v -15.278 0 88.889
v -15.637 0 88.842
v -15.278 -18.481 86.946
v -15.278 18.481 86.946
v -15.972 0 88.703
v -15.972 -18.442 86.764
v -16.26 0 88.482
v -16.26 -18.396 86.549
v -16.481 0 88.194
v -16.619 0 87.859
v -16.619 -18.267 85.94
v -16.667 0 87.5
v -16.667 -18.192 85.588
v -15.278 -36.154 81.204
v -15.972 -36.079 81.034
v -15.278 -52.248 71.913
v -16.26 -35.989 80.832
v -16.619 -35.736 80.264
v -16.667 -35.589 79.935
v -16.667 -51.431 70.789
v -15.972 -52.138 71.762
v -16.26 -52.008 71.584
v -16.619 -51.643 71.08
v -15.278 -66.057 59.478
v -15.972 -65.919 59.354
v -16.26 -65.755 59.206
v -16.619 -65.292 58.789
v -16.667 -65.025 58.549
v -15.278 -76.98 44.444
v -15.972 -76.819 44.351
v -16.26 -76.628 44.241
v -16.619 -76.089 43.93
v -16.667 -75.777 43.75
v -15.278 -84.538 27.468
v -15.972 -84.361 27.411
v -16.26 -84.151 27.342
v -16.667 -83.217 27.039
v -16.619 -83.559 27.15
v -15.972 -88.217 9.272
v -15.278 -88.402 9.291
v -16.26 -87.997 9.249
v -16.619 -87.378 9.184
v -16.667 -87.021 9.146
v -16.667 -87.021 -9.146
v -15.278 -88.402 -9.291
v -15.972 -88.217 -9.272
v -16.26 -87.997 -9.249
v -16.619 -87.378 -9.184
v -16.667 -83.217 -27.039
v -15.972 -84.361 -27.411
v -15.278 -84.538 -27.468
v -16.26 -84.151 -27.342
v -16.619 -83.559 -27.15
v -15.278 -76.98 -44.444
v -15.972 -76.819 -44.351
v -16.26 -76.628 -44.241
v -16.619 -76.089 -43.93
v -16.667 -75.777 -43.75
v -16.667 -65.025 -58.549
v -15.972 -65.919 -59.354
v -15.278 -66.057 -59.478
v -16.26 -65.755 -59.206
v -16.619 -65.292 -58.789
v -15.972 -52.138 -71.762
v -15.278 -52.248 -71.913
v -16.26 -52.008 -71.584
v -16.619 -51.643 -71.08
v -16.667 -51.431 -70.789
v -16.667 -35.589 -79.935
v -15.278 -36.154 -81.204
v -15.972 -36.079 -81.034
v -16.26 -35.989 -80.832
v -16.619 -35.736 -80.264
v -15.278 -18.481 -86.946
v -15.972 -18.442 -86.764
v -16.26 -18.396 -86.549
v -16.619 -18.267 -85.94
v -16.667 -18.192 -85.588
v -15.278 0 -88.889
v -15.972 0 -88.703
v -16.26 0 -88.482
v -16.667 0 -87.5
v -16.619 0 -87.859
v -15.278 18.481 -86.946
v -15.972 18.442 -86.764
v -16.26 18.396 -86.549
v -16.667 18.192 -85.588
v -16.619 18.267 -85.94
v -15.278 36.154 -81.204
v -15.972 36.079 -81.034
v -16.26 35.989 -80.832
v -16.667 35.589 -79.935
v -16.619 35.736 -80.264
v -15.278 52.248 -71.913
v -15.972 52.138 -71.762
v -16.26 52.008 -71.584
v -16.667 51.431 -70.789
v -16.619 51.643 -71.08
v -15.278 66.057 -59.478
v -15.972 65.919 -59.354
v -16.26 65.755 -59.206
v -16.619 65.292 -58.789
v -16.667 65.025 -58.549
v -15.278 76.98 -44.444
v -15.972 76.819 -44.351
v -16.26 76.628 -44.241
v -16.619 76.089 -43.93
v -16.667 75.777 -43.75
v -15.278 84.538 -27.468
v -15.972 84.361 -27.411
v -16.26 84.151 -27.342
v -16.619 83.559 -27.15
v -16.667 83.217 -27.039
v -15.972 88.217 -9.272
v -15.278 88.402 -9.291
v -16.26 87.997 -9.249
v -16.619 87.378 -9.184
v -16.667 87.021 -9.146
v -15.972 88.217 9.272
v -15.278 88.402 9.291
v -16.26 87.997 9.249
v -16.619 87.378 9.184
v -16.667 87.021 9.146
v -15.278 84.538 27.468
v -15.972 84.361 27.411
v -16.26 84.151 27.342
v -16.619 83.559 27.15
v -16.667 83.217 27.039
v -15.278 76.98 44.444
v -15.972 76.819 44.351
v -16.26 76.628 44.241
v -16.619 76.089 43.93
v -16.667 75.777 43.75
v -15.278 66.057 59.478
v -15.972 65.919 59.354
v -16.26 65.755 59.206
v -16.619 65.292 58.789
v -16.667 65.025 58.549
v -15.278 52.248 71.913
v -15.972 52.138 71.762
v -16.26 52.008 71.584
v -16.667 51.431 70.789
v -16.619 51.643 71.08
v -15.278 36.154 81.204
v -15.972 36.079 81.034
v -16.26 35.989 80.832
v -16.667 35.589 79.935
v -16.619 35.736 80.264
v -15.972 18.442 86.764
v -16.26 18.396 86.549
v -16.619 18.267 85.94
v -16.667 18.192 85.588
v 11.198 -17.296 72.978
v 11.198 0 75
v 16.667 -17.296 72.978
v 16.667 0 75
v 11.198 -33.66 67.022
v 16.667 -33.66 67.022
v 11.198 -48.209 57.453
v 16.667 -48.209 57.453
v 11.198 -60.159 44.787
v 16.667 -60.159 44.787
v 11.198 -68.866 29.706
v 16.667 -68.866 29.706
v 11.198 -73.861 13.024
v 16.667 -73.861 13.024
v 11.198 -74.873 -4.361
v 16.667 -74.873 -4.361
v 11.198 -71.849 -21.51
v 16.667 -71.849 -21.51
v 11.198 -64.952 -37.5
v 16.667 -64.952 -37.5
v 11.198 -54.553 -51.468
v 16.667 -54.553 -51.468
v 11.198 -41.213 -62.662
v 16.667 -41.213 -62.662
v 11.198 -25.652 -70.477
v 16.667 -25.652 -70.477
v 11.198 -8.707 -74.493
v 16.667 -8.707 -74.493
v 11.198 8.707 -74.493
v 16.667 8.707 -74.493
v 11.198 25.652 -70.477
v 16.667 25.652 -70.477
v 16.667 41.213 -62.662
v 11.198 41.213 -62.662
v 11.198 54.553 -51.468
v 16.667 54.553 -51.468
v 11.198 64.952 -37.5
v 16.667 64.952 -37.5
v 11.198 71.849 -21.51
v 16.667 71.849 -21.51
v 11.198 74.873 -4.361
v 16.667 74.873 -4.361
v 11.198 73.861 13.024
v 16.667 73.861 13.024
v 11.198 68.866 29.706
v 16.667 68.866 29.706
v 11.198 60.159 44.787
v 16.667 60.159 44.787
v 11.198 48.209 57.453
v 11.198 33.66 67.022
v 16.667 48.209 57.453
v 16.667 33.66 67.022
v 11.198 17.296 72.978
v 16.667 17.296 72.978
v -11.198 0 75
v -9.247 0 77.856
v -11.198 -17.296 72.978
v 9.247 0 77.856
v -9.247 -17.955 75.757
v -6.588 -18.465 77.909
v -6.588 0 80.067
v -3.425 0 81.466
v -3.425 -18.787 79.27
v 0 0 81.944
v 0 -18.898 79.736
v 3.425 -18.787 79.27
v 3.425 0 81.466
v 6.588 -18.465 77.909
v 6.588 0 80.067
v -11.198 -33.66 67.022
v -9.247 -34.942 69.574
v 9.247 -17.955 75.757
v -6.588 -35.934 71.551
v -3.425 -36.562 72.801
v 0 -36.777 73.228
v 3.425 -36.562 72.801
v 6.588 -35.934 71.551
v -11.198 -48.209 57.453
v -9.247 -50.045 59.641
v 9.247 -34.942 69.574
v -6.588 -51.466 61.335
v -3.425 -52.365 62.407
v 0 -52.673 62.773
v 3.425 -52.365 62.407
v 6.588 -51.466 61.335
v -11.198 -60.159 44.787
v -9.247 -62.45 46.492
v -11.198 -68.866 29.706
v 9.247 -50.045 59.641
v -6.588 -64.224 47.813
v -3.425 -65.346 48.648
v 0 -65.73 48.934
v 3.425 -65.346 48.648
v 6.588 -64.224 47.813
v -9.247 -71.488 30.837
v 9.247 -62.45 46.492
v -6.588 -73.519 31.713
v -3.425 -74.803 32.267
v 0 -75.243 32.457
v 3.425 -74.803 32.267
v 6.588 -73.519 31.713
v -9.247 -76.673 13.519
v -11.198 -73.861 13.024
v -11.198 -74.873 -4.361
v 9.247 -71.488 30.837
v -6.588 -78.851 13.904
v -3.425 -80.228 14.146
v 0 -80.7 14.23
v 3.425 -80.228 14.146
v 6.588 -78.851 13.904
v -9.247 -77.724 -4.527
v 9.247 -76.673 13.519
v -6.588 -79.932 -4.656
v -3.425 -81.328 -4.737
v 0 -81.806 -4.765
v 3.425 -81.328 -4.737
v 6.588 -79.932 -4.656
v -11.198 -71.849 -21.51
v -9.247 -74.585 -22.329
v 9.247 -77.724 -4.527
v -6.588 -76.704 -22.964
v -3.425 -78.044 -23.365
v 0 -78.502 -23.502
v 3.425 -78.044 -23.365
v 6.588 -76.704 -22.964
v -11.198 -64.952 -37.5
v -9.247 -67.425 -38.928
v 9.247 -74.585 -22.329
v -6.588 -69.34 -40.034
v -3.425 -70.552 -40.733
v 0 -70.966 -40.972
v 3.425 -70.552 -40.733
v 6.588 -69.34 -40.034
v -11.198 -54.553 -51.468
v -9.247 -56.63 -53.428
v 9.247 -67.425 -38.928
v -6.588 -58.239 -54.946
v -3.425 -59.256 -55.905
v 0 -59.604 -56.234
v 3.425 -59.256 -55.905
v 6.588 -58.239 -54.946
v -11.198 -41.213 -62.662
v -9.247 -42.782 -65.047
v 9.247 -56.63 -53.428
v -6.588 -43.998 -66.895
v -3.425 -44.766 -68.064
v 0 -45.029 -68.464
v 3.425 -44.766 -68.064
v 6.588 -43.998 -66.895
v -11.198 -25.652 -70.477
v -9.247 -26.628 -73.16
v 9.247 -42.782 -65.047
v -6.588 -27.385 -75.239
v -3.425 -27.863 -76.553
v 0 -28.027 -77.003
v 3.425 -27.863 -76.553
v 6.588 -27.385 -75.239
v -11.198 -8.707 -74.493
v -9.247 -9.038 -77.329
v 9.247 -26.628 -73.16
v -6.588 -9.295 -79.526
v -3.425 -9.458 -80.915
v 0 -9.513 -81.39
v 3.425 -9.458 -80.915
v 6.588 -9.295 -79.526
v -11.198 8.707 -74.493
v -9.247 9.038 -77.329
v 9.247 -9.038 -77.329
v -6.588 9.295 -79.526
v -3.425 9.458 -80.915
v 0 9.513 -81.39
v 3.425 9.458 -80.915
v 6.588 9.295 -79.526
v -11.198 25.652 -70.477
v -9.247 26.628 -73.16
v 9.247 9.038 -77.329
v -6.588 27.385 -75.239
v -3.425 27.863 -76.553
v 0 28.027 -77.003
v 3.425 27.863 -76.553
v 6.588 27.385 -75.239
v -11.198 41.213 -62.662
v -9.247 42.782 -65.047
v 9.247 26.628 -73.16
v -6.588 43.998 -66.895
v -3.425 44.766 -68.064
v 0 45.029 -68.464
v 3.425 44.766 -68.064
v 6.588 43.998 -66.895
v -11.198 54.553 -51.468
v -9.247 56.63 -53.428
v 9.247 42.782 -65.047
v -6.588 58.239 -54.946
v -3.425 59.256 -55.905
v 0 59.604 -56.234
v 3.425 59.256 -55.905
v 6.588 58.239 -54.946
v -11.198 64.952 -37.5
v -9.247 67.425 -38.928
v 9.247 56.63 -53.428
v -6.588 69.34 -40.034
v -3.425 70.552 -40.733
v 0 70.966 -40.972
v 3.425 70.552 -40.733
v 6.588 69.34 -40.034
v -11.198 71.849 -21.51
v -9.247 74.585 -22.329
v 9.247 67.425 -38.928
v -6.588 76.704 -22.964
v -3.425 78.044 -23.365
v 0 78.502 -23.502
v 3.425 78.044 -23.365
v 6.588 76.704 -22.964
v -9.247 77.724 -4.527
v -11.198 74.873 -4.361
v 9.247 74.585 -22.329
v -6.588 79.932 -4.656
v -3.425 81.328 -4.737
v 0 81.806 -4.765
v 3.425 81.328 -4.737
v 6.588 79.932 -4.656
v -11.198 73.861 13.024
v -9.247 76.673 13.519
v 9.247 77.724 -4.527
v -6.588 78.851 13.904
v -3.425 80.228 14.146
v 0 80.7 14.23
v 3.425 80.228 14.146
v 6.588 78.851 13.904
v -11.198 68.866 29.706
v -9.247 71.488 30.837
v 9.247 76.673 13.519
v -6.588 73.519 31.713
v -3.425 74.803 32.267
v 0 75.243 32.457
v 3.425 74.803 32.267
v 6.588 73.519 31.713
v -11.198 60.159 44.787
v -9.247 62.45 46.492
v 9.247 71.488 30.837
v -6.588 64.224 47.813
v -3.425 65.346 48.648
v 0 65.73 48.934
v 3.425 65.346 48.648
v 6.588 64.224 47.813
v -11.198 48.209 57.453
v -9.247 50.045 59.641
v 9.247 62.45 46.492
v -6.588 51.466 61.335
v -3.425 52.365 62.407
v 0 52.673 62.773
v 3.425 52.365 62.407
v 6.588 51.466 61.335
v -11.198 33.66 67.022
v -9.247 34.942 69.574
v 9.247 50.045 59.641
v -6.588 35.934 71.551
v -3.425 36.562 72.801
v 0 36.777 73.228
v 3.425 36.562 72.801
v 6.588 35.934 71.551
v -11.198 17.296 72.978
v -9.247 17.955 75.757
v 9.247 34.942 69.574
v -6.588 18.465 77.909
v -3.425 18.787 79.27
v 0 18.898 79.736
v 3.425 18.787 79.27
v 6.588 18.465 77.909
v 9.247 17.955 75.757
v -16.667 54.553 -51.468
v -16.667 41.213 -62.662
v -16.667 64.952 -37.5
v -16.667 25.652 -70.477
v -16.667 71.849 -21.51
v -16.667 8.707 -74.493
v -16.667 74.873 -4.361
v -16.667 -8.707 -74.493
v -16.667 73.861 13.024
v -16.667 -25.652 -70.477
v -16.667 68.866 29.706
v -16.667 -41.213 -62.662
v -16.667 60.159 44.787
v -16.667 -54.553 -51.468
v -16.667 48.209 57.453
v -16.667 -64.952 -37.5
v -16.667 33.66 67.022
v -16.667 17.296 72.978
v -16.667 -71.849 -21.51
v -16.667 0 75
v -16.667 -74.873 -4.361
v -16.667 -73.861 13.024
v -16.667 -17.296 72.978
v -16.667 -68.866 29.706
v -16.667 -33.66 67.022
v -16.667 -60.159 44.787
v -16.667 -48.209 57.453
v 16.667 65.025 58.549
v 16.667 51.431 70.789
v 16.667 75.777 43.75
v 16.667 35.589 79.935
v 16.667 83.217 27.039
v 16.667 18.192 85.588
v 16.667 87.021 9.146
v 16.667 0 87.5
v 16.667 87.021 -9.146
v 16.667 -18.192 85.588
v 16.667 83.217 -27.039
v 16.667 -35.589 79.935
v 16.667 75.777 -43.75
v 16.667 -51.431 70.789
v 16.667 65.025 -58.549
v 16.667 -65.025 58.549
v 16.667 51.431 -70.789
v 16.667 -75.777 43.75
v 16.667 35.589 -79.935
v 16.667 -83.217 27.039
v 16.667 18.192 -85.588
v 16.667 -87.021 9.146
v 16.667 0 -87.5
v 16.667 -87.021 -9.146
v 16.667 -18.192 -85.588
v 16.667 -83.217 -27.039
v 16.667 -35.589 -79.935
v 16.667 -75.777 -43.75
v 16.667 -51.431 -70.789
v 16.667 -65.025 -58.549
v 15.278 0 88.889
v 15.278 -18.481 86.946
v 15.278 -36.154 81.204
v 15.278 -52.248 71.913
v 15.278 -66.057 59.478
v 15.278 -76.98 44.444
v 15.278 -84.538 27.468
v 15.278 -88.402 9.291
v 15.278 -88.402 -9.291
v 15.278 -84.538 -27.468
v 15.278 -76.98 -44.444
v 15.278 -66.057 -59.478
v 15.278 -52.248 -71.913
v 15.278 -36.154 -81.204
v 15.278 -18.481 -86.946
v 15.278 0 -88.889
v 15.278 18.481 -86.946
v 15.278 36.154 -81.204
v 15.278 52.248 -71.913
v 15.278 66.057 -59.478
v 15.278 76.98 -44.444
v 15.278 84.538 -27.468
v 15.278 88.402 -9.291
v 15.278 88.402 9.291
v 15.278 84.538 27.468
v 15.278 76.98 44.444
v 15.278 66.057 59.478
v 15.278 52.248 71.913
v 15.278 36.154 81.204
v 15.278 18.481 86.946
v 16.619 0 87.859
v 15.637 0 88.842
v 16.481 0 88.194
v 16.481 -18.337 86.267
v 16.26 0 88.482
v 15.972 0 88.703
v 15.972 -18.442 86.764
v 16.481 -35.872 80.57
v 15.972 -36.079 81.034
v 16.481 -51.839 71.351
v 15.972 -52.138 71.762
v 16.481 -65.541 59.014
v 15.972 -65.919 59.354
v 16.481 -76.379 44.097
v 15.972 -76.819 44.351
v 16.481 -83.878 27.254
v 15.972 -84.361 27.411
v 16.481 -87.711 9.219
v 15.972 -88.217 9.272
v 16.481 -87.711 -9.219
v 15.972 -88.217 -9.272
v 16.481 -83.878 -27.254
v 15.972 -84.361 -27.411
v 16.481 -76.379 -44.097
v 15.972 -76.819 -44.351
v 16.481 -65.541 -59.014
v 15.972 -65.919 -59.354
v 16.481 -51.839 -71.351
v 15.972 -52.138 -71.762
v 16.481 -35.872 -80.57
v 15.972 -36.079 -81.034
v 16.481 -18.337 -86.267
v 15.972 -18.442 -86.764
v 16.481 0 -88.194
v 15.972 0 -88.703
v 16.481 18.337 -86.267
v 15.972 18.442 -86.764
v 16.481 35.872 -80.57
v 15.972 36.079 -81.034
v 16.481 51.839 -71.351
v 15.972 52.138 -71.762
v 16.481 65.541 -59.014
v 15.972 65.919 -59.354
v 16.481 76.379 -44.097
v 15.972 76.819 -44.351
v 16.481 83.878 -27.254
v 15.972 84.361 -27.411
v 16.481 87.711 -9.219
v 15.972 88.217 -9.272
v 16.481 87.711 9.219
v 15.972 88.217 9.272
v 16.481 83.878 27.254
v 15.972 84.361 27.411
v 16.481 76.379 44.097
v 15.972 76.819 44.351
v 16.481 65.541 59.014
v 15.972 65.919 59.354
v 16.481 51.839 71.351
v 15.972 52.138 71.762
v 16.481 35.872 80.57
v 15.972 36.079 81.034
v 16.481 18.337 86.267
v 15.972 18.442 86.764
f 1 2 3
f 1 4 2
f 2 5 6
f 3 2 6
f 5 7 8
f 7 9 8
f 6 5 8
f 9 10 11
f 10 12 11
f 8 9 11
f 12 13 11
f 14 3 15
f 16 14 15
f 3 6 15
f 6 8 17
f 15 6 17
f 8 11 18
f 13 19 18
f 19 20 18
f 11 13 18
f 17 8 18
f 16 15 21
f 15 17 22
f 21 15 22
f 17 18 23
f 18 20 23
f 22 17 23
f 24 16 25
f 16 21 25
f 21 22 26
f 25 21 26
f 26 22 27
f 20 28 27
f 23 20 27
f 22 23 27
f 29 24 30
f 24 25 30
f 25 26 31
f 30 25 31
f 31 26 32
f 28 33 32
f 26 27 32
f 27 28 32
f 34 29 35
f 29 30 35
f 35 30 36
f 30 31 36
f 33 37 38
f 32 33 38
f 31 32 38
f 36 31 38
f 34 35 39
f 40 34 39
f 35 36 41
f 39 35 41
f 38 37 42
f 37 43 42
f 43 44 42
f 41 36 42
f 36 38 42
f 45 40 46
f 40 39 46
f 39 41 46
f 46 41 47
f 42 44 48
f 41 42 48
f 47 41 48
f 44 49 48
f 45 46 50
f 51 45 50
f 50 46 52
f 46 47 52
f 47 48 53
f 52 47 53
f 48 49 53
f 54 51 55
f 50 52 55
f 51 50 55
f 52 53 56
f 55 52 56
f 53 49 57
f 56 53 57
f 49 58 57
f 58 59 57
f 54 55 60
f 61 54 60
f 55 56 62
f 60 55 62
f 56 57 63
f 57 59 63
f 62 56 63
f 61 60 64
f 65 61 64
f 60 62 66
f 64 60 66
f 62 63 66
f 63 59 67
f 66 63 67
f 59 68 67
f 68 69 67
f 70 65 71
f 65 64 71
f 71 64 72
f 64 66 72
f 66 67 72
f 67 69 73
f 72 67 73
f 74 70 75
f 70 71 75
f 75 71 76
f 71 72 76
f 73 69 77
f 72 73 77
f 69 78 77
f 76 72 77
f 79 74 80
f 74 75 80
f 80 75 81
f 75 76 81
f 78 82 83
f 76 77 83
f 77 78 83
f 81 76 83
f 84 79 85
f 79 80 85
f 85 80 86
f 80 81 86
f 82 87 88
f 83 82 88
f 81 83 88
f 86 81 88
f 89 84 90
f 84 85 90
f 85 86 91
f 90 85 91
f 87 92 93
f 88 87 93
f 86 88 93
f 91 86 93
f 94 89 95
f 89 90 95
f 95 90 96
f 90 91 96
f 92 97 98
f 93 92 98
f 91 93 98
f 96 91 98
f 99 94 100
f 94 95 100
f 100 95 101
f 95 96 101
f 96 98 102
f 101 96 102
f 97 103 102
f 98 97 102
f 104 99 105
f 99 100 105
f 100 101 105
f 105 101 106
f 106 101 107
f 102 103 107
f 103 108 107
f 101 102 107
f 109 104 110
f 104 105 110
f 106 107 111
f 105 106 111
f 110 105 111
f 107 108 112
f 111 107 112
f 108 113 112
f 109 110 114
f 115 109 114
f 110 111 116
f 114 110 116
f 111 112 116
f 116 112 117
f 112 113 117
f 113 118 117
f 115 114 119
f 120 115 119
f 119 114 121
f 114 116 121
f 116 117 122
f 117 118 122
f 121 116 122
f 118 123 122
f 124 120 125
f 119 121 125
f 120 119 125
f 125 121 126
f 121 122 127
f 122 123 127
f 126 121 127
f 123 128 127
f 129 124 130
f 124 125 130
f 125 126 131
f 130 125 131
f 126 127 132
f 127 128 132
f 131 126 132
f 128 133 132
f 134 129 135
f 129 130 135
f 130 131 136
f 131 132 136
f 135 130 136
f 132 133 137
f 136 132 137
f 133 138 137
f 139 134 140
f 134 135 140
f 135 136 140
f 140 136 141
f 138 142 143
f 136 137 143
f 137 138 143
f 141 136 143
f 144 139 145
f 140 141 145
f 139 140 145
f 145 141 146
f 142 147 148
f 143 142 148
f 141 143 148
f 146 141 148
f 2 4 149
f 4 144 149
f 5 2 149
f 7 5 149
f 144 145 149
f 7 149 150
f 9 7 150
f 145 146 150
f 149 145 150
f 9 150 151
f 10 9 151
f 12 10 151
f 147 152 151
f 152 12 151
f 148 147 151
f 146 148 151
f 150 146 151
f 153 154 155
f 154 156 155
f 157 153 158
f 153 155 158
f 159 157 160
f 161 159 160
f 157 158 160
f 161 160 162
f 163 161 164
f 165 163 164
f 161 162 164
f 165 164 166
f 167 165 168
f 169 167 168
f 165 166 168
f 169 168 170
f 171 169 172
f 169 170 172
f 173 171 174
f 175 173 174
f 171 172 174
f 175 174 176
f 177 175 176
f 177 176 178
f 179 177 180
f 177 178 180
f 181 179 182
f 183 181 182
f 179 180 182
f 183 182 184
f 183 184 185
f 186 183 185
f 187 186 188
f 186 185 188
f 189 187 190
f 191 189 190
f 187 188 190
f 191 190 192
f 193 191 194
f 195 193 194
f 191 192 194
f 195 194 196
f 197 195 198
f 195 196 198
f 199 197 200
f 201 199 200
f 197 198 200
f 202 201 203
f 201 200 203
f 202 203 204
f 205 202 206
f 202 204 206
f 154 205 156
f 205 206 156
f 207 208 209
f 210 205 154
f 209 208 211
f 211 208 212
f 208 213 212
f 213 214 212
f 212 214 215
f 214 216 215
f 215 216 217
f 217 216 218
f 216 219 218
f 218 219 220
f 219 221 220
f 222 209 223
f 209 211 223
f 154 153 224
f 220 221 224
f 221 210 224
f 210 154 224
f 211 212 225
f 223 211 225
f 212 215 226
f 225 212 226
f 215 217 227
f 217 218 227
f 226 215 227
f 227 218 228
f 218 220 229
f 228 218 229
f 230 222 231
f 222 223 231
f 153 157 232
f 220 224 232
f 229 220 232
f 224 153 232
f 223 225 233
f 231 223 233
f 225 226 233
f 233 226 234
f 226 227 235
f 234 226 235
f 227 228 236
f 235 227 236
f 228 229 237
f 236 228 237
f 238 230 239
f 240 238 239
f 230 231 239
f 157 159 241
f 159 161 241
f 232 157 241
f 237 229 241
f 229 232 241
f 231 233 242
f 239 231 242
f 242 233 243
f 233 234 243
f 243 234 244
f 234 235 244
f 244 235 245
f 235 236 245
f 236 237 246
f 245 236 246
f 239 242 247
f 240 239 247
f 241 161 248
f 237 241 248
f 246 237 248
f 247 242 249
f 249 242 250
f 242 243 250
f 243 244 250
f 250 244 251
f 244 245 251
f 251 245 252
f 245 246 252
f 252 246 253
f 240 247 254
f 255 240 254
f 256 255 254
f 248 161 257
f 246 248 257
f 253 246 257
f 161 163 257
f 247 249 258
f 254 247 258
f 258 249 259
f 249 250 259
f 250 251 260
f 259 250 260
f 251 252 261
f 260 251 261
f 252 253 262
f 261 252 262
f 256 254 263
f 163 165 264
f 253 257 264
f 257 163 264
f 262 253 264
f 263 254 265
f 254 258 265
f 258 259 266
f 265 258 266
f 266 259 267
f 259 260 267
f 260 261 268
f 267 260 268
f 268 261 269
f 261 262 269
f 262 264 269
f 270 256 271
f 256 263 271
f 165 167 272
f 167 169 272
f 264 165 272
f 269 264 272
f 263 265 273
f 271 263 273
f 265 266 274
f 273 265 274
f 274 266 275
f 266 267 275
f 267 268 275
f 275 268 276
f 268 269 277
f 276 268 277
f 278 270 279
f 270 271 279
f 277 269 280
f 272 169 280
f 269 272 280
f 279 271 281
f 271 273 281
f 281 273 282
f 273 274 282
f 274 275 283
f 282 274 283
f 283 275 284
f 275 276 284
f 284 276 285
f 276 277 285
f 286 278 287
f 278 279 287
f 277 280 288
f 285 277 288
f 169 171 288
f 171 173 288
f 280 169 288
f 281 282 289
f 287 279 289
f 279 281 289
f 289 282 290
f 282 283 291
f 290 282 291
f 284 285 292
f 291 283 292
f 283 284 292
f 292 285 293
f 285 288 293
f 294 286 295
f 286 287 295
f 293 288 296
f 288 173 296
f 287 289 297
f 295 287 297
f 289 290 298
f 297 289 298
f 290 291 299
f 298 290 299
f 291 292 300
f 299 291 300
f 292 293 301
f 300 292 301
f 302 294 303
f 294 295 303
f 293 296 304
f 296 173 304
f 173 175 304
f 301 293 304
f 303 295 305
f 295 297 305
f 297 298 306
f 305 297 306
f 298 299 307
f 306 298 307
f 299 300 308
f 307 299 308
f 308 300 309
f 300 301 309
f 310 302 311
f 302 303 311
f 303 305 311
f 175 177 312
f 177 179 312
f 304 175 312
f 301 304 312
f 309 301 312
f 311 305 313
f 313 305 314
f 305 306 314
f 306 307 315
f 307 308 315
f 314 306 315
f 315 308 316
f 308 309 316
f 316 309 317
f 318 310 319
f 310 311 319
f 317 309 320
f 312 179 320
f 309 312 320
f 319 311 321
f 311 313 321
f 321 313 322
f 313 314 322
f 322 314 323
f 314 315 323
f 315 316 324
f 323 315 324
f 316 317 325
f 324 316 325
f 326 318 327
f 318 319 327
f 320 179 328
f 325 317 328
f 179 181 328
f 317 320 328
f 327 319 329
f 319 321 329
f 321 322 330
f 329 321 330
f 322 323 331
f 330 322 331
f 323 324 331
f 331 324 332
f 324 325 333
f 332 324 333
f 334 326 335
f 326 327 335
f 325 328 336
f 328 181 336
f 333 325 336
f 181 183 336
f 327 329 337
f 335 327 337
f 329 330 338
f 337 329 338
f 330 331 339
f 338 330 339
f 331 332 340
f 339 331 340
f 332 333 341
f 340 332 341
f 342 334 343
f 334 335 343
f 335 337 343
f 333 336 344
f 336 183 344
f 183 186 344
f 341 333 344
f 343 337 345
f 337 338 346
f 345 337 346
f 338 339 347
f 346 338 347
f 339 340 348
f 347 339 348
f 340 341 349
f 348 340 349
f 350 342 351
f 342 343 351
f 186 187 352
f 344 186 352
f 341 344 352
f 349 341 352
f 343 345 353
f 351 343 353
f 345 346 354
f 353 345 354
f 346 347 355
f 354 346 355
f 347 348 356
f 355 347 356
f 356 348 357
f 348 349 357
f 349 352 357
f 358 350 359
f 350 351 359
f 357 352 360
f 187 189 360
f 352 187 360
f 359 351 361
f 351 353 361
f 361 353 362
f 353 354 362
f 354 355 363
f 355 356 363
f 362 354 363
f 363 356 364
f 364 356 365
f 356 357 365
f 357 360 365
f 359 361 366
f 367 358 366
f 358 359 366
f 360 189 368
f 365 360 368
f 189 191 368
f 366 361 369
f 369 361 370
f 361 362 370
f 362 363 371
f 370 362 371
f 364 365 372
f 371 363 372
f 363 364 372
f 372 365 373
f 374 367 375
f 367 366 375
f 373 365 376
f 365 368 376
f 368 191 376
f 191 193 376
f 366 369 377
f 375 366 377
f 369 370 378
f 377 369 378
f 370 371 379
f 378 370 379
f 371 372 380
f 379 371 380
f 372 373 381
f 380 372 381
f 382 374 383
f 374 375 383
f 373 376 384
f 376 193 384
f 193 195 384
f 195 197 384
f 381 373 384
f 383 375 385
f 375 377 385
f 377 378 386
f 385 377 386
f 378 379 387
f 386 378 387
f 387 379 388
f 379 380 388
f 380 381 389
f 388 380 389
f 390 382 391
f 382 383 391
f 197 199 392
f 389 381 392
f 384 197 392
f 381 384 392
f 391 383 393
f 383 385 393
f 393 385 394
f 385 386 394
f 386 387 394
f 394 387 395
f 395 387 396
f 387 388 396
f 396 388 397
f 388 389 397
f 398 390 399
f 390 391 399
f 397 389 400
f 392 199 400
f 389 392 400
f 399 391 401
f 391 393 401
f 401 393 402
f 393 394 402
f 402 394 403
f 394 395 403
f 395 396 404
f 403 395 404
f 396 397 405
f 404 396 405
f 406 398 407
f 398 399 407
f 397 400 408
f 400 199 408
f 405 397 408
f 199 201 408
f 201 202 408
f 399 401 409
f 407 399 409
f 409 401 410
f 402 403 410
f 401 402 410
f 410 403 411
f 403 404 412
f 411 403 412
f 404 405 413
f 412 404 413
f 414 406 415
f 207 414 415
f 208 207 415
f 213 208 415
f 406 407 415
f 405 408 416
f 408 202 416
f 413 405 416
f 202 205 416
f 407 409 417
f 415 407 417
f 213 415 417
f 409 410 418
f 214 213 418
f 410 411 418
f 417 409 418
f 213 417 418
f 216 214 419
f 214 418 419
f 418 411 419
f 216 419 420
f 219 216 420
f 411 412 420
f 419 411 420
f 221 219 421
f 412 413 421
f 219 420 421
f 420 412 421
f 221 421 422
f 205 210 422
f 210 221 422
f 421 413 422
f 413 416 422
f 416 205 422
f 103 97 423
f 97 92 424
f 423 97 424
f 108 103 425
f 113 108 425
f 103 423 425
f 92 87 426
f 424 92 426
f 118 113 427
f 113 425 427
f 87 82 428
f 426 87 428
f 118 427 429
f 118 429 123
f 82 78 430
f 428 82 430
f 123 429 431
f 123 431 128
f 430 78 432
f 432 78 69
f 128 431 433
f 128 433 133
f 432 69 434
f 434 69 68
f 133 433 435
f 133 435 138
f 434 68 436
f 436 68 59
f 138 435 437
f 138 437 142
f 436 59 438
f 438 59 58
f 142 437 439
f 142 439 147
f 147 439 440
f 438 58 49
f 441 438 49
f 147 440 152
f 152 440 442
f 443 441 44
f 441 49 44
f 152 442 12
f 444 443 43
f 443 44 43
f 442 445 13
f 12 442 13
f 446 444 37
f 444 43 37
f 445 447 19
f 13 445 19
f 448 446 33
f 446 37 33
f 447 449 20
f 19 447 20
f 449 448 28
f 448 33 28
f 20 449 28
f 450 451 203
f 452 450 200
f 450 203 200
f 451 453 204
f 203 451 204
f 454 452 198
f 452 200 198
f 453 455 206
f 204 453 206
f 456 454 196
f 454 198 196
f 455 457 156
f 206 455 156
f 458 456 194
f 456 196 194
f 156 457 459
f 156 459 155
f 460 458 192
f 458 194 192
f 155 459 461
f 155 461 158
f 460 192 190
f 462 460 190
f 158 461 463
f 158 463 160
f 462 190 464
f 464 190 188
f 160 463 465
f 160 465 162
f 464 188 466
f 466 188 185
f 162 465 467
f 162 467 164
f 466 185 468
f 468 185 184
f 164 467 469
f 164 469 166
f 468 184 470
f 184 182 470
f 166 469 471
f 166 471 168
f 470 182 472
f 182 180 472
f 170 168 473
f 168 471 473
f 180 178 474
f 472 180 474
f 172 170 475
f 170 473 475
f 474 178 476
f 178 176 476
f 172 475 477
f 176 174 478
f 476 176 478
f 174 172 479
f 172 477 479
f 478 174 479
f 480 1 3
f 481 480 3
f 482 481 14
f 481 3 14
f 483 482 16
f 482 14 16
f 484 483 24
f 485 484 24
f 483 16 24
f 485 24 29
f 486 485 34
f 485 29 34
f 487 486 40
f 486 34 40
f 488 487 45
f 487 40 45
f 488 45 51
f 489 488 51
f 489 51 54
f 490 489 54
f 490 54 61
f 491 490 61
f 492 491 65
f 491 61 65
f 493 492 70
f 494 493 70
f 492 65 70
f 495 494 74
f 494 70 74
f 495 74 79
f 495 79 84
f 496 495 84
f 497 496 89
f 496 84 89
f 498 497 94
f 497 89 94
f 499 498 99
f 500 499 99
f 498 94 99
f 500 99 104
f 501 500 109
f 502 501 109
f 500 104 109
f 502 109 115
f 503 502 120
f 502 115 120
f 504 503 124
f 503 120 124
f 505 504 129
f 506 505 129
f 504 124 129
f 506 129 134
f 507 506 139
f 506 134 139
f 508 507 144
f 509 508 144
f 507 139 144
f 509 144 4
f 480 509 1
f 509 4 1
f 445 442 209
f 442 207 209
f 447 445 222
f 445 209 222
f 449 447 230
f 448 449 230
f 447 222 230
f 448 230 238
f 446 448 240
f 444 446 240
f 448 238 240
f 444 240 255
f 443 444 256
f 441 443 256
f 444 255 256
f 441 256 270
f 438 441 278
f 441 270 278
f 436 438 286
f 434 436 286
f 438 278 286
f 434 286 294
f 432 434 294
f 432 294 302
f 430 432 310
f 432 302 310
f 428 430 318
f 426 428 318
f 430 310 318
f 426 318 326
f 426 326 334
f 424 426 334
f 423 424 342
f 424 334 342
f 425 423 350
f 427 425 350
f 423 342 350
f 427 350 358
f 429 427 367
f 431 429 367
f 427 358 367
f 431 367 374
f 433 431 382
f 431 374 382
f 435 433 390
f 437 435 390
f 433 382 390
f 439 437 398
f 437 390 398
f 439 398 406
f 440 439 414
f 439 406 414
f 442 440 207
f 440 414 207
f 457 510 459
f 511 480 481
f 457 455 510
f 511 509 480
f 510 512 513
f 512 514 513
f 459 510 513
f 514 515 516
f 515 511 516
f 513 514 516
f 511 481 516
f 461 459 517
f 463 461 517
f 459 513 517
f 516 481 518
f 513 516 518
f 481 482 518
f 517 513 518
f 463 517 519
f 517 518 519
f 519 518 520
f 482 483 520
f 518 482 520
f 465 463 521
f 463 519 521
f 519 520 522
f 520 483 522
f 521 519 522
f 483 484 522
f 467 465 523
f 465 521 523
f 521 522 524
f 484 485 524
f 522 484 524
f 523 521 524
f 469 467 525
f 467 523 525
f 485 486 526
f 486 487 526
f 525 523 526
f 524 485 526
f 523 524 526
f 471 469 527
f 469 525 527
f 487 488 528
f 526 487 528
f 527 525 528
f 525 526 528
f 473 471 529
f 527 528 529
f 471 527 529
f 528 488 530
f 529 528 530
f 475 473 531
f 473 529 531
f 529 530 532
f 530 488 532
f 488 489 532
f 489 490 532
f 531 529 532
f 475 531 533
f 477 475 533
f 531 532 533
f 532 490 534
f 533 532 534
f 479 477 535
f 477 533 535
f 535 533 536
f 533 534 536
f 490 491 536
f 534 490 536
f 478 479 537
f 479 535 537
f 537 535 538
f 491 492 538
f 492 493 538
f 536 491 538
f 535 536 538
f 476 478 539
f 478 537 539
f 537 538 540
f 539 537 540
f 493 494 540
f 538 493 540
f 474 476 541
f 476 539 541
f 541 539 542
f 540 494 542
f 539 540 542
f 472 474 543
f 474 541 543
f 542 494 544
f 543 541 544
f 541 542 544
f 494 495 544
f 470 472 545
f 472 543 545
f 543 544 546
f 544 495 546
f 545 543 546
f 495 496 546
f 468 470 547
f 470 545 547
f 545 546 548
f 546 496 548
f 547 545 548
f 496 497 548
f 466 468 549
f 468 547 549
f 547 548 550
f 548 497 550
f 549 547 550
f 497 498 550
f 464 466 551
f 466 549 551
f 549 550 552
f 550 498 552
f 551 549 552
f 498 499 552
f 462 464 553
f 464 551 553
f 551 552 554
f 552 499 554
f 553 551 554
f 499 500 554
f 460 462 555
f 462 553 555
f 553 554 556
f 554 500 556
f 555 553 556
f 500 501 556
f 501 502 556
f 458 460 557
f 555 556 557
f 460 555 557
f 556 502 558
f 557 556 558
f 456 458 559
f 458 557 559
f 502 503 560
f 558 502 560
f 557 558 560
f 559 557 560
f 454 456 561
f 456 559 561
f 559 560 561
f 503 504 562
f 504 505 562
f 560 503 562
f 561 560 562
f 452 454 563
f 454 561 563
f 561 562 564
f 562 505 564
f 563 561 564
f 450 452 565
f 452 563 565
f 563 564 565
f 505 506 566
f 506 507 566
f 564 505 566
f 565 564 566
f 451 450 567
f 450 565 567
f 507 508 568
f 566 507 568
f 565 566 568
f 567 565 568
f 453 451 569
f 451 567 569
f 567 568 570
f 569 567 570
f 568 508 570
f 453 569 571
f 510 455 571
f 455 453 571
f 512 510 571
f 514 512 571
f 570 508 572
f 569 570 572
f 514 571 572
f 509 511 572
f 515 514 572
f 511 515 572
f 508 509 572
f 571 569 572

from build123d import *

# Parameters (mm, degrees)
FILLET1_R    = 5
SCALE1_SCALE = 0.277777778


with BuildPart() as part:
    # Sketch2 → Revolve1 (revolve)
    with BuildSketch(Plane.XY, mode=Mode.PRIVATE) as revolve1_sk:
        with BuildLine():
            Line((40.311288741, 270), (60, 270))
            Line((60, 270), (60, 320))
            Line((60, 320), (-60, 320))
            Line((-60, 320), (-60, 270))
            Line((-60, 270), (-40.311288741, 270))
            ThreePointArc((-40.311288741, 270), (0, 295), (40.311288741, 270))
        make_face()
    revolve(revolve1_sk.sketch.rotate(Axis((-83.864002629, 0, 0), (1, 0, 0)), 90), axis=Axis((-83.864002629, 0, 0), (1, 0, 0)))

    # Fillet1
    fillet1_edges = [part.edges().sort_by_distance(p)[0] for p in [
        (-60, 0, -320),
        (60, 0, -320),
    ]]
    fillet(fillet1_edges, radius=FILLET1_R)


with BuildPart() as part_1:
    # Scale1: scaled about (0, 0, 0)
    add(part.part.scale(SCALE1_SCALE))


solid = part_1.part
